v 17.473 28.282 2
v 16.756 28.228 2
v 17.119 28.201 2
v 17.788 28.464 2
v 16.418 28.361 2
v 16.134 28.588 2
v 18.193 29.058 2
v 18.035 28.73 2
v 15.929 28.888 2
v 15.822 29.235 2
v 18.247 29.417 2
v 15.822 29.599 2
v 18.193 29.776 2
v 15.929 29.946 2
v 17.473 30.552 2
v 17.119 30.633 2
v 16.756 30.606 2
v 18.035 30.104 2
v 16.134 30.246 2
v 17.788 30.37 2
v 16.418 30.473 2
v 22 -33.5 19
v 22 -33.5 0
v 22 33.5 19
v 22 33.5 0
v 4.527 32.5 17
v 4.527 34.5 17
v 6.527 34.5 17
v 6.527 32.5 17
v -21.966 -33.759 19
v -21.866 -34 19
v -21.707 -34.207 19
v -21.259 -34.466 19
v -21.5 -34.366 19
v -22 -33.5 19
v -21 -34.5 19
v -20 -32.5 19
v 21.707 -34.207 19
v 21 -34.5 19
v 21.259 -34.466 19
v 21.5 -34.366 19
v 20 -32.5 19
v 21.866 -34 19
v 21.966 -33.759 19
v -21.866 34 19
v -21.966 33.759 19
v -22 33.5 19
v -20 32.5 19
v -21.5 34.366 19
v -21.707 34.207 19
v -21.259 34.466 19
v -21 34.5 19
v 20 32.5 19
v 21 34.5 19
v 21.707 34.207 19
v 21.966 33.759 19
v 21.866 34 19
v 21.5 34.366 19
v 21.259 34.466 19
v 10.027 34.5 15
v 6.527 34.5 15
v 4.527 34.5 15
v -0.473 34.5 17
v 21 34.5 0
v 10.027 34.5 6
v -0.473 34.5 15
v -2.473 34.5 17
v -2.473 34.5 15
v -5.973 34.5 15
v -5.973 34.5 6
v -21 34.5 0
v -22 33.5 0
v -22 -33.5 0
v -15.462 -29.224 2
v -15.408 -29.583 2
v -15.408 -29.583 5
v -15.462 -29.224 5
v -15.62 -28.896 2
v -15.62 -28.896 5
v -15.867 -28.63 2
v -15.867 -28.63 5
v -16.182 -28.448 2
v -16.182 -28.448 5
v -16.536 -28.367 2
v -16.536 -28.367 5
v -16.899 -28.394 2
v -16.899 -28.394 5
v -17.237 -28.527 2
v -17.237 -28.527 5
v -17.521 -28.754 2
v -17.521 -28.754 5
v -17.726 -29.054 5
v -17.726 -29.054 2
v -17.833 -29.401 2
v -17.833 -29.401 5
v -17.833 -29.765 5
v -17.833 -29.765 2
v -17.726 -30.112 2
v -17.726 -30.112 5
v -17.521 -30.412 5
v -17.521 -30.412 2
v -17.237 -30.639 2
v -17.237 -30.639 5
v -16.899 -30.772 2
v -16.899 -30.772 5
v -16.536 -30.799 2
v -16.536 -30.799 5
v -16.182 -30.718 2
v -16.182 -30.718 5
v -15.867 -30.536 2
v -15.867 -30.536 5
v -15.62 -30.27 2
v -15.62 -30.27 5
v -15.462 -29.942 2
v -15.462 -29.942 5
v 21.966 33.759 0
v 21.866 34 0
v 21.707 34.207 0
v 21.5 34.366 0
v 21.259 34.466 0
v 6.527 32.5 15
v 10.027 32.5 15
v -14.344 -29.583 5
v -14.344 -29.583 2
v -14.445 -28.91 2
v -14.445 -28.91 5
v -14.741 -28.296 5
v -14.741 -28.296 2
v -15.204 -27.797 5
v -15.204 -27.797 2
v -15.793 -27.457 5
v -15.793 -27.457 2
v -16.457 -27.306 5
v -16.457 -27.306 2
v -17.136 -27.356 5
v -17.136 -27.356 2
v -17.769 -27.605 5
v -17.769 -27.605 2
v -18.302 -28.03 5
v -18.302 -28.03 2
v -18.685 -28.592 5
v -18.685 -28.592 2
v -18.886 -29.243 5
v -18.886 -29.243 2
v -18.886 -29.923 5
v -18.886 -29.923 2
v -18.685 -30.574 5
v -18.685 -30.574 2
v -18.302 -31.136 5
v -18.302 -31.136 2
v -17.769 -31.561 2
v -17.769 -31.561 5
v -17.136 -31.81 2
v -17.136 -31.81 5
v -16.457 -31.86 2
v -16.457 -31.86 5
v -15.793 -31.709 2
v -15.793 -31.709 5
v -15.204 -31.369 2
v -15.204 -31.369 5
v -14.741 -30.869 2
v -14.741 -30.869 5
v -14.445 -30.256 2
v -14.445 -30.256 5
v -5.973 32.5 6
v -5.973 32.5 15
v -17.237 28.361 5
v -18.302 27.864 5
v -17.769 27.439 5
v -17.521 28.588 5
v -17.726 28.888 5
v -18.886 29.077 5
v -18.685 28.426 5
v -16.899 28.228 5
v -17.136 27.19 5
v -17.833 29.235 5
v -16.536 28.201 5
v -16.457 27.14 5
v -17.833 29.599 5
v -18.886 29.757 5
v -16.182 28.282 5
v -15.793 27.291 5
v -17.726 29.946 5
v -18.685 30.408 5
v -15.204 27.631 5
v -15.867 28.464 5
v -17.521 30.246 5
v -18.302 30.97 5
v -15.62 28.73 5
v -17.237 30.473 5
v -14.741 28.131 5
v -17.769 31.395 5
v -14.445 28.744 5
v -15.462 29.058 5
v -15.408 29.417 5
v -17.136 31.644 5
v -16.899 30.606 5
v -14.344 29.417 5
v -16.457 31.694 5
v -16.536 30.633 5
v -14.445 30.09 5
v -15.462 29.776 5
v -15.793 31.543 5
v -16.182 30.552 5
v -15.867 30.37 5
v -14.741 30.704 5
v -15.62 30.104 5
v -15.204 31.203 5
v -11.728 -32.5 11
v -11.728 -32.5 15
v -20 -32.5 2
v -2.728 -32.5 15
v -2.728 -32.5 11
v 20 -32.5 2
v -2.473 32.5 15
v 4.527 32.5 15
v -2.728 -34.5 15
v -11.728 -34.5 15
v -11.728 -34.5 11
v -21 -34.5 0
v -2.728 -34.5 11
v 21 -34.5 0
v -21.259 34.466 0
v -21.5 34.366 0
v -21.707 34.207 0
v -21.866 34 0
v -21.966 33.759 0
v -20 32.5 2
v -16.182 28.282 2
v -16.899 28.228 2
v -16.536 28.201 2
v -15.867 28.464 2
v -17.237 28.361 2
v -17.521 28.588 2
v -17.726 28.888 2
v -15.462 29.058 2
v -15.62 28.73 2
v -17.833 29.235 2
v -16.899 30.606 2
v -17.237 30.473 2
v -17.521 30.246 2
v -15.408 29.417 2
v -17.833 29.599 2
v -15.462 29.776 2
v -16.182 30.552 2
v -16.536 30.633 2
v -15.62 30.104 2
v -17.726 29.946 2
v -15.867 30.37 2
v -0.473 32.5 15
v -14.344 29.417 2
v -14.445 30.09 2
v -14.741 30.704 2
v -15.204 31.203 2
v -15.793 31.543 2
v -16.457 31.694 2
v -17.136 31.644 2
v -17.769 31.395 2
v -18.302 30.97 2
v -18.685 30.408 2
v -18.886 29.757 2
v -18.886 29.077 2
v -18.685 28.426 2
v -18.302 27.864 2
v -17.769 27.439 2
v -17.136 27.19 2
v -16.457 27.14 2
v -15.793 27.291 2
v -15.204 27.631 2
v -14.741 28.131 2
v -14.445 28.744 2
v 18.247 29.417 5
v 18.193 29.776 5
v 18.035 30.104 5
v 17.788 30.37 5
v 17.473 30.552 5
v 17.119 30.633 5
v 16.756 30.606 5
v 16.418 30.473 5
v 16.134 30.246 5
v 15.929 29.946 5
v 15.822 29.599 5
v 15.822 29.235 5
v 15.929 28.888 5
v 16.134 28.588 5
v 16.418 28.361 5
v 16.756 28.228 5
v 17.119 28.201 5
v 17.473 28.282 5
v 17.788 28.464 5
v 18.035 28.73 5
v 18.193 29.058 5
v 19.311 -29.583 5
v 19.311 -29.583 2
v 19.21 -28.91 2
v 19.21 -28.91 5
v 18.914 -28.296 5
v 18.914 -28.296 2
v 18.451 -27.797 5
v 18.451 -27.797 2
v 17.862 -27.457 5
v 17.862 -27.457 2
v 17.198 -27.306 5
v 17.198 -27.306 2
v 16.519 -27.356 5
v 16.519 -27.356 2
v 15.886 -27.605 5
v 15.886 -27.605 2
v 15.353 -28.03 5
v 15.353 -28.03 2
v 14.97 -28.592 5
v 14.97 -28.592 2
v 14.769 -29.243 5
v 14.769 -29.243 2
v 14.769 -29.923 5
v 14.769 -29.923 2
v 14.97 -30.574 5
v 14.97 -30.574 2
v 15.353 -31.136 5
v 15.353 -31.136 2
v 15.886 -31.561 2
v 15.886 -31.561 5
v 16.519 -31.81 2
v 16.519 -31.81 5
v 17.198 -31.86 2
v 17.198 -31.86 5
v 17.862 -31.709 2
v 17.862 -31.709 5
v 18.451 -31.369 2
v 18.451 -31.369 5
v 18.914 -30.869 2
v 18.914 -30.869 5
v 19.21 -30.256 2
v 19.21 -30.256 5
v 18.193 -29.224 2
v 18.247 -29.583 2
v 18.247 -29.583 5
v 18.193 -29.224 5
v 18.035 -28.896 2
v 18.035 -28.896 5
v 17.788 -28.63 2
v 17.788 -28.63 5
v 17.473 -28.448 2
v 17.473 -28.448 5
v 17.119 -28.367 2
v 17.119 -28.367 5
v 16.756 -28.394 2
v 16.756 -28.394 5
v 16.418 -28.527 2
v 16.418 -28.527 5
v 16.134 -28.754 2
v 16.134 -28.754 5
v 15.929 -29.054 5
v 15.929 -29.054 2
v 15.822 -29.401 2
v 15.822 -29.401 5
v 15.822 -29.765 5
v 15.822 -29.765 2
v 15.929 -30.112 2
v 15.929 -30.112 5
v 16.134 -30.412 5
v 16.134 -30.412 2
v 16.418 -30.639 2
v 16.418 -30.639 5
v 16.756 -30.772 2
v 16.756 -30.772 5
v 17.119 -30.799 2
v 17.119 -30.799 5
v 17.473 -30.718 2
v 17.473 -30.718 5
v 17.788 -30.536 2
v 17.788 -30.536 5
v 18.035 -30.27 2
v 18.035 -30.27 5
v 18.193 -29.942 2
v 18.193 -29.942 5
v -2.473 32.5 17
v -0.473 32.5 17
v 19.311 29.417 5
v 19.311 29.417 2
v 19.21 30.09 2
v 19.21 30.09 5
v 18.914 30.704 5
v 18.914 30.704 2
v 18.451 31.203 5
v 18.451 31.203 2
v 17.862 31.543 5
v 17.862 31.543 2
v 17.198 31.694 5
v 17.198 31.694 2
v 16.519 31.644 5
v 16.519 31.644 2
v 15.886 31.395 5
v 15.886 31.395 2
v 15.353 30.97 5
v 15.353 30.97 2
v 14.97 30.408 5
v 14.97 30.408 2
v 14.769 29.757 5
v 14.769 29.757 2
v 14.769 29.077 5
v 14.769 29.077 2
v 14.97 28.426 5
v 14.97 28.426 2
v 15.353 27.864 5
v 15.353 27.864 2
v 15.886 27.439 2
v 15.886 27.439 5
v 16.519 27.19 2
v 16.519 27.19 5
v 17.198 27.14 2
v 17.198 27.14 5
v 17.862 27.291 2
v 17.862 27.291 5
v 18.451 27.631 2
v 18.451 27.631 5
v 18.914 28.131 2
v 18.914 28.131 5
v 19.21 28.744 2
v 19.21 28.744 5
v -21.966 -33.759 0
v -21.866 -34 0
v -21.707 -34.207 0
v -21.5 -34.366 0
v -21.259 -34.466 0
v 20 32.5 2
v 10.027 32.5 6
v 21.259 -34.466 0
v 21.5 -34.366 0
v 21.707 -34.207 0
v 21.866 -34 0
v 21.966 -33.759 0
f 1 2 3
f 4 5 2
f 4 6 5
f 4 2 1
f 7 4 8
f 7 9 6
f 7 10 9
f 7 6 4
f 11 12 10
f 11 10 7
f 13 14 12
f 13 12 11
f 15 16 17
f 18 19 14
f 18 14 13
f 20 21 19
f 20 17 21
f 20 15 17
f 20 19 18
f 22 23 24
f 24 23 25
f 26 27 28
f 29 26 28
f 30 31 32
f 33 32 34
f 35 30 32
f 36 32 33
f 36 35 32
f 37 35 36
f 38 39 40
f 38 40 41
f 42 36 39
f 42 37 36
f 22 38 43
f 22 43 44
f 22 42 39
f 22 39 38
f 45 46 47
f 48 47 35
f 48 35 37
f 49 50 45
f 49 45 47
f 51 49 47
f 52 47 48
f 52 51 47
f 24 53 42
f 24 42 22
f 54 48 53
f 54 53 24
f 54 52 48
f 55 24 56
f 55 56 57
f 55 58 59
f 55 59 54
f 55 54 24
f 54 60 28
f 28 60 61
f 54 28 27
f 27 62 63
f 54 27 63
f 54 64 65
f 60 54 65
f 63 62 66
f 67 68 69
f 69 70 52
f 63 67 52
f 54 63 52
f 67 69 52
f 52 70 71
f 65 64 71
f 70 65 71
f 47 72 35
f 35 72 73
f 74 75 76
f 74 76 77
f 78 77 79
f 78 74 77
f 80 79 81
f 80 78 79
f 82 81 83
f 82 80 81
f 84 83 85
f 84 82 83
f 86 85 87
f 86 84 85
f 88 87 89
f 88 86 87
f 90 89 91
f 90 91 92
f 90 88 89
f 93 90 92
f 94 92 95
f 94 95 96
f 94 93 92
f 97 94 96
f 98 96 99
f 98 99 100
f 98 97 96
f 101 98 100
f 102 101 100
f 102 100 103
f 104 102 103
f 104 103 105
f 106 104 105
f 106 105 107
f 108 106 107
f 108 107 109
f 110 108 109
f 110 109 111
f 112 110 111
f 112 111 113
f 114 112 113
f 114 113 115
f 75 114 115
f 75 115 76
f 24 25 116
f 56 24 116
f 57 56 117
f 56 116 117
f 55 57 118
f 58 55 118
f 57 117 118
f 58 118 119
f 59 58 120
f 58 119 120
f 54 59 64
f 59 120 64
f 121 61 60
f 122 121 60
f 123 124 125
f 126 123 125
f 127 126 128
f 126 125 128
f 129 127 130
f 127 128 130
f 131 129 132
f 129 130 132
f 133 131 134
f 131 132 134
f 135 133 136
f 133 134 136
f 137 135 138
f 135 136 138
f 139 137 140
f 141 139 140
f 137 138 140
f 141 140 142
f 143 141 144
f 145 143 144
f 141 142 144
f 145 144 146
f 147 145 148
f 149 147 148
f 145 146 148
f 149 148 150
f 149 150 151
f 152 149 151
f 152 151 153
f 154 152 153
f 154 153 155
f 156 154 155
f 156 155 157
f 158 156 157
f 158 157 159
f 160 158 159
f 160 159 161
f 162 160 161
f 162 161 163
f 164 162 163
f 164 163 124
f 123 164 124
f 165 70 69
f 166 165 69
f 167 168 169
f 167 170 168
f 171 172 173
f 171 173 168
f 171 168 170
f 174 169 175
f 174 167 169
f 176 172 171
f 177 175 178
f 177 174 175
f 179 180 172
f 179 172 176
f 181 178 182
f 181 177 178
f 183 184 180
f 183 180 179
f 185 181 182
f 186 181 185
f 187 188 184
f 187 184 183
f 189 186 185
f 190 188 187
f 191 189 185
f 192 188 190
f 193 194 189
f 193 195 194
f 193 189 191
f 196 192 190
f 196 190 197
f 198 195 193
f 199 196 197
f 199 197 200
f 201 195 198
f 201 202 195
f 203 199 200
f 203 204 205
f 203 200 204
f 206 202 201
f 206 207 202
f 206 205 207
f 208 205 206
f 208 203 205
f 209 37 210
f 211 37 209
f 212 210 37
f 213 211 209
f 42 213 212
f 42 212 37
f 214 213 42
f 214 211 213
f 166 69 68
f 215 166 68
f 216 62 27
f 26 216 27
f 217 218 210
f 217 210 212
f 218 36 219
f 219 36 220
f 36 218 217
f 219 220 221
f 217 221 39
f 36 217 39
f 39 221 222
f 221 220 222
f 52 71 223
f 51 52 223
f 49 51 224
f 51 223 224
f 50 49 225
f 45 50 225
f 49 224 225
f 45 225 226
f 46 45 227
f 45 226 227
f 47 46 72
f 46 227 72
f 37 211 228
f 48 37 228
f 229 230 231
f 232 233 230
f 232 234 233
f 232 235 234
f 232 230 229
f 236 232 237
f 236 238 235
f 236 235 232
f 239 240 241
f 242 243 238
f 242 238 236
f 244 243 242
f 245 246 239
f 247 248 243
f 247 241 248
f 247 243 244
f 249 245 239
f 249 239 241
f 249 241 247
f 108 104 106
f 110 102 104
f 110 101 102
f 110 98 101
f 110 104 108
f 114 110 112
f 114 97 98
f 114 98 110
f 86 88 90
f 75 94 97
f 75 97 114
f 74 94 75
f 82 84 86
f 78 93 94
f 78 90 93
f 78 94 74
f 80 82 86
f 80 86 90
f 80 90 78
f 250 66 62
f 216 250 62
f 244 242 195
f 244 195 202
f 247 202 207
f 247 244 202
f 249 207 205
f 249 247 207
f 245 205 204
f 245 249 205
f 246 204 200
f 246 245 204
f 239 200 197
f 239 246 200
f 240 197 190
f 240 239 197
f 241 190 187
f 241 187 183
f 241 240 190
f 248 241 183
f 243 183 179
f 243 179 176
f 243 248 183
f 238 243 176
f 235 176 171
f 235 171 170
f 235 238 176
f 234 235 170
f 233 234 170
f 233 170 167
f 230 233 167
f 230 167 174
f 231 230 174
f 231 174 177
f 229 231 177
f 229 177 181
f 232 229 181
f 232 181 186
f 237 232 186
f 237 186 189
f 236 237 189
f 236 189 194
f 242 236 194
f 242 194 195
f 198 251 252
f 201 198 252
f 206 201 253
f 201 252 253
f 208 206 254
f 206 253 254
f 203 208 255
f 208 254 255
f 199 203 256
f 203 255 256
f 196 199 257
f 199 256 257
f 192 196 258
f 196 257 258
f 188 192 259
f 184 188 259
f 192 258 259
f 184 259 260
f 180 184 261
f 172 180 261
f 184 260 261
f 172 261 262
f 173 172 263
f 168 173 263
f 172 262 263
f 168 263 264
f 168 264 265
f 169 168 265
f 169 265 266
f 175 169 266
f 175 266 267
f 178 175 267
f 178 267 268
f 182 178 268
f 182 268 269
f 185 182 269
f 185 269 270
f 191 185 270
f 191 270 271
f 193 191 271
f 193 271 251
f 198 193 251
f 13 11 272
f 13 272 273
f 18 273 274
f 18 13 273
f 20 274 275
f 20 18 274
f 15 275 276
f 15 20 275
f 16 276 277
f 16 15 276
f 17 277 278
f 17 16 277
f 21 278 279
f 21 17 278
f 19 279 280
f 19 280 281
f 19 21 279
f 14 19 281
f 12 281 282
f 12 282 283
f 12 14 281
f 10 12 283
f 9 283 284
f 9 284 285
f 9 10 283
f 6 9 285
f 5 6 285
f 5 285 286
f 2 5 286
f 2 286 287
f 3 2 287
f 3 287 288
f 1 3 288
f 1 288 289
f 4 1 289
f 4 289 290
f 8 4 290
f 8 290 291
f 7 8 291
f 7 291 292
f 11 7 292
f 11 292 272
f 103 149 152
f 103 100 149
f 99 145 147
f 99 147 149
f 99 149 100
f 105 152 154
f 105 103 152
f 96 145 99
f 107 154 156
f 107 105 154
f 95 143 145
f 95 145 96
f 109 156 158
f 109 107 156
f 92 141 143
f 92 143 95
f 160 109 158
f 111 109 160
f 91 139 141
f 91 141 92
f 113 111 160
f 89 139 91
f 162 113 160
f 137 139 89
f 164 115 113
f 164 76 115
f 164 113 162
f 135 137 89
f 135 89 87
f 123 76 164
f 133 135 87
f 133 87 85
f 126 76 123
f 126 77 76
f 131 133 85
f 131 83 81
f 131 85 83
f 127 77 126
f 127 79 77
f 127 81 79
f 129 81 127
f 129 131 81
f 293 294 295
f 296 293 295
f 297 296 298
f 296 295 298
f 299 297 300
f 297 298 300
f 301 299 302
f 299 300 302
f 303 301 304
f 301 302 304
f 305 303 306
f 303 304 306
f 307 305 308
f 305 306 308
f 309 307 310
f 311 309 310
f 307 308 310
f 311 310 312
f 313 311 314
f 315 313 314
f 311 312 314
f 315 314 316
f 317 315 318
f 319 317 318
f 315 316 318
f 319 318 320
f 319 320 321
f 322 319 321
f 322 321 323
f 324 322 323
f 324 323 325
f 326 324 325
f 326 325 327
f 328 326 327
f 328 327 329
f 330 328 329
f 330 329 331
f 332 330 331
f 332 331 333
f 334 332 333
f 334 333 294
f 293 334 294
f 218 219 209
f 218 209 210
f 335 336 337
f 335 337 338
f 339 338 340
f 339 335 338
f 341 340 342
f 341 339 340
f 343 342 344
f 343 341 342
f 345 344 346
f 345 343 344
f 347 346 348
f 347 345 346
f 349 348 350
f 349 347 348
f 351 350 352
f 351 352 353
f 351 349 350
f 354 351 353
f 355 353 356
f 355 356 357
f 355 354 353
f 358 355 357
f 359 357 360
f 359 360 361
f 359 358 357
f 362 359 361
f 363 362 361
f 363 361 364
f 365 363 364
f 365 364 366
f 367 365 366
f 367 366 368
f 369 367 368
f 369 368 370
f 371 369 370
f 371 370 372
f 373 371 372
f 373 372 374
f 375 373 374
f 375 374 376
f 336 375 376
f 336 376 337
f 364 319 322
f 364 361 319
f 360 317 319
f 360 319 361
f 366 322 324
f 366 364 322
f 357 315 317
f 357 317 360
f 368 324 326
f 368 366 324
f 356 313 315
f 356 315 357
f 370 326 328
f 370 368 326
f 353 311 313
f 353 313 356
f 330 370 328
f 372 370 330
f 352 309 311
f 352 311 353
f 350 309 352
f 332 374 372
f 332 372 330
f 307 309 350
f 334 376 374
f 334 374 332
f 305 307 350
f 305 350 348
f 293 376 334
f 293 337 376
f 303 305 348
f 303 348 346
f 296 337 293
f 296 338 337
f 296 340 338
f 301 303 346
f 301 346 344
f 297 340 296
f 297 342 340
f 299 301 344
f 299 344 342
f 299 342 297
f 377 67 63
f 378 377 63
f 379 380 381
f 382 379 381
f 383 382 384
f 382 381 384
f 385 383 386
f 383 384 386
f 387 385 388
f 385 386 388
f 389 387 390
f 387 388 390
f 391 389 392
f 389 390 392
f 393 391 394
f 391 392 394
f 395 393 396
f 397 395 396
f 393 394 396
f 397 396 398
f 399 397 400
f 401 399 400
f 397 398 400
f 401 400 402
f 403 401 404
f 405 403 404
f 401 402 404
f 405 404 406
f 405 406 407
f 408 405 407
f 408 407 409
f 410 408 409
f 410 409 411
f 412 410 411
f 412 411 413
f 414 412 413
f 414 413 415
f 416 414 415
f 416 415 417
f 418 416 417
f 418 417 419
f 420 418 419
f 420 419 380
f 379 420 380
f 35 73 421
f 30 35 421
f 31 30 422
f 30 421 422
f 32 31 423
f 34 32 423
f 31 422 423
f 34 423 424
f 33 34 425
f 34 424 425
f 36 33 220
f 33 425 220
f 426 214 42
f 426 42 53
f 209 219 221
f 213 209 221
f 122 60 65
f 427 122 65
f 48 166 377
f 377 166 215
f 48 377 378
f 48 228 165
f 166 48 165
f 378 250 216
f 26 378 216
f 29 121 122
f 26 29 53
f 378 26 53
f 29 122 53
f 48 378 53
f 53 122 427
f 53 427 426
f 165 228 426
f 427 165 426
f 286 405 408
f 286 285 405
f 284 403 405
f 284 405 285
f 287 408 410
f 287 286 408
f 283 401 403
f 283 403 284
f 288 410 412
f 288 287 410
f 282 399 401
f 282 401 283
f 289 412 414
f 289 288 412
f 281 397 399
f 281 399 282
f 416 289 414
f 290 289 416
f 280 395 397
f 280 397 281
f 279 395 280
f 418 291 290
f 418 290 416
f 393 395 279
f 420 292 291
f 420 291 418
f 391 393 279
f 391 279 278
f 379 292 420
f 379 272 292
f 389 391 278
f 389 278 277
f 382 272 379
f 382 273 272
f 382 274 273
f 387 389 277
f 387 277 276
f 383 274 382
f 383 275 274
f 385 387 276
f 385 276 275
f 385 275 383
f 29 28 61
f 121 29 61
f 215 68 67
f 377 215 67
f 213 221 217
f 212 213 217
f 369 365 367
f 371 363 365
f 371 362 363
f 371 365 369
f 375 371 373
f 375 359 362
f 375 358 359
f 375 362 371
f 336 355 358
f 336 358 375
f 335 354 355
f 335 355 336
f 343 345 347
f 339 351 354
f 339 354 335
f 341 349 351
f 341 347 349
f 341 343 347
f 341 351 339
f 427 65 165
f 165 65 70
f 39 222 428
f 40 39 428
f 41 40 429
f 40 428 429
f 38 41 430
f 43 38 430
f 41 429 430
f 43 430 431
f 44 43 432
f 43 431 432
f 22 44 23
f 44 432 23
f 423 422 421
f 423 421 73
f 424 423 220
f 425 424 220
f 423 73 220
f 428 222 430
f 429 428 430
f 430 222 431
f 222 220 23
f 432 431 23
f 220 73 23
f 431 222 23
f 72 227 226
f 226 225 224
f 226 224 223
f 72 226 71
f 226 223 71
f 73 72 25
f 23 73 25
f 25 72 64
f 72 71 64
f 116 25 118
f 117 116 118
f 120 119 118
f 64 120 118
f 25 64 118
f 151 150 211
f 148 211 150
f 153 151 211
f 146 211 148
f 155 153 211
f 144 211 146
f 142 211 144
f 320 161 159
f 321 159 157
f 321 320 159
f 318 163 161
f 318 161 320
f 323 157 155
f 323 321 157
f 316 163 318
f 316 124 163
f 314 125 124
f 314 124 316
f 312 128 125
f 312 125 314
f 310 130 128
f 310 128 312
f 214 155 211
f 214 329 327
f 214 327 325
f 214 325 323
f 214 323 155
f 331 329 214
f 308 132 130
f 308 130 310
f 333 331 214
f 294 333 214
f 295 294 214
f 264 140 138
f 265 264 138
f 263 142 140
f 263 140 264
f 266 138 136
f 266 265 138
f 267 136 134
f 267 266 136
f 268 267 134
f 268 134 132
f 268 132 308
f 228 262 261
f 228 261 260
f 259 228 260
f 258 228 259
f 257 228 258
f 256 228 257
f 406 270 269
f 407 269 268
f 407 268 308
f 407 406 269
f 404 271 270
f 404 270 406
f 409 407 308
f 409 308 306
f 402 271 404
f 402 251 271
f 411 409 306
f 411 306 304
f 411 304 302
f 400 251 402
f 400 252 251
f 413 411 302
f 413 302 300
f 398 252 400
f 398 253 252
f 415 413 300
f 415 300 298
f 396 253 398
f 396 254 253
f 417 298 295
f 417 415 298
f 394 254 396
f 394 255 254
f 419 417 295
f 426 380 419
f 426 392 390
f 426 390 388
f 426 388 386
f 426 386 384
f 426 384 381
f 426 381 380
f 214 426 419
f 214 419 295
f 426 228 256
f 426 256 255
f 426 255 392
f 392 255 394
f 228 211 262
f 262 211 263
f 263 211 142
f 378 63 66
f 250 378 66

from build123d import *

# Parameters (mm, degrees)
F0_W     = 40
F0_H     = 65
F0_R     = 2.2837988166
F0_R_2   = 1.2192556023
F1_DEPTH = 2
F2_DEPTH = 19
F3_DEPTH = 5
F5_DEPTH = 5
F6_W     = 9
F6_H     = 4
F7_DEPTH = 5


with BuildPart() as f1:
    # F0 (on Top) → F1 (new body)
    with BuildSketch(Plane.XY):
        with BuildLine():
            ThreePointArc((22, 33.5), (21.7071067812, 34.2071067812), (21, 34.5))
            Line((21, 34.5), (-21, 34.5))
            ThreePointArc((-21, 34.5), (-21.7071067812, 34.2071067812), (-22, 33.5))
            Line((-22, 33.5), (-22, -33.5))
            ThreePointArc((-22, -33.5), (-21.7071067812, -34.2071067812), (-21, -34.5))
            Line((-21, -34.5), (21, -34.5))
            ThreePointArc((21, -34.5), (21.7071067812, -34.2071067812), (22, -33.5))
            Line((22, -33.5), (22, 33.5))
        make_face()
        Rectangle(F0_W, F0_H, mode=Mode.SUBTRACT)
        Rectangle(F0_W, F0_H)
        with Locations((-16.6275631636, -29.5829899758)):
            Circle(F0_R, mode=Mode.SUBTRACT)
        with Locations((17.0274368364, -29.5829899758)):
            Circle(F0_R, mode=Mode.SUBTRACT)
        with Locations((-16.6275631636, 29.4170100242)):
            Circle(F0_R, mode=Mode.SUBTRACT)
        with Locations((17.0274368364, 29.4170100242)):
            Circle(F0_R, mode=Mode.SUBTRACT)
        with Locations((17.0274368364, -29.5829899758)):
            Circle(F0_R)
        with Locations((17.0274368364, -29.5829899758)):
            Circle(F0_R_2, mode=Mode.SUBTRACT)
        with Locations((-16.6275631636, -29.5829899758)):
            Circle(F0_R)
        with Locations((-16.6275631636, -29.5829899758)):
            Circle(F0_R_2, mode=Mode.SUBTRACT)
        with Locations((17.0274368364, 29.4170100242)):
            Circle(F0_R)
        with Locations((17.0274368364, 29.4170100242)):
            Circle(F0_R_2, mode=Mode.SUBTRACT)
        with Locations((-16.6275631636, 29.4170100242)):
            Circle(F0_R)
        with Locations((-16.6275631636, 29.4170100242)):
            Circle(F0_R_2, mode=Mode.SUBTRACT)
        with Locations((-16.6275631636, -29.5829899758)):
            Circle(F0_R_2)
        with Locations((17.0274368364, -29.5829899758)):
            Circle(F0_R_2)
        with Locations((17.0274368364, 29.4170100242)):
            Circle(F0_R_2)
        with Locations((-16.6275631636, 29.4170100242)):
            Circle(F0_R_2)
    extrude(amount=F1_DEPTH)

    # F0 (on Top) → F2 (join)
    with BuildSketch(Plane.XY):
        with BuildLine():
            ThreePointArc((22, 33.5), (21.7071067812, 34.2071067812), (21, 34.5))
            Line((21, 34.5), (-21, 34.5))
            ThreePointArc((-21, 34.5), (-21.7071067812, 34.2071067812), (-22, 33.5))
            Line((-22, 33.5), (-22, -33.5))
            ThreePointArc((-22, -33.5), (-21.7071067812, -34.2071067812), (-21, -34.5))
            Line((-21, -34.5), (21, -34.5))
            ThreePointArc((21, -34.5), (21.7071067812, -34.2071067812), (22, -33.5))
            Line((22, -33.5), (22, 33.5))
        make_face()
        Rectangle(F0_W, F0_H, mode=Mode.SUBTRACT)
    extrude(amount=F2_DEPTH)

    # F0 (on Top) → F3 (join)
    with BuildSketch(Plane.XY):
        with Locations((-16.6275631636, 29.4170100242)):
            Circle(F0_R)
        with Locations((-16.6275631636, 29.4170100242)):
            Circle(F0_R_2, mode=Mode.SUBTRACT)
        with Locations((17.0274368364, 29.4170100242)):
            Circle(F0_R)
        with Locations((17.0274368364, 29.4170100242)):
            Circle(F0_R_2, mode=Mode.SUBTRACT)
        with Locations((-16.6275631636, -29.5829899758)):
            Circle(F0_R)
        with Locations((-16.6275631636, -29.5829899758)):
            Circle(F0_R_2, mode=Mode.SUBTRACT)
        with Locations((17.0274368364, -29.5829899758)):
            Circle(F0_R)
        with Locations((17.0274368364, -29.5829899758)):
            Circle(F0_R_2, mode=Mode.SUBTRACT)
    extrude(amount=F3_DEPTH)

    # F4 (on face) → F5 (cut)
    with BuildSketch(Plane(origin=(0, 34.5, 0), x_dir=(-1, 0, 0), z_dir=(0, 1, 0))):
        Polygon((-10.027, 6), (5.973, 6), (5.973, 15), (2.473, 15), (2.473, 17), (0.473, 17), (0.473, 15), (-4.527, 15), (-4.527, 17), (-6.527, 17), (-6.527, 15), (-10.027, 15), align=None)
    extrude(amount=-F5_DEPTH, mode=Mode.SUBTRACT)

    # F6 (on face) → F7 (cut)
    with BuildSketch(Plane.XZ.offset(34.5)):
        with Locations((-7.2275631636, 13)):
            Rectangle(F6_W, F6_H)
    extrude(amount=-F7_DEPTH, mode=Mode.SUBTRACT)


solid = f1.part
